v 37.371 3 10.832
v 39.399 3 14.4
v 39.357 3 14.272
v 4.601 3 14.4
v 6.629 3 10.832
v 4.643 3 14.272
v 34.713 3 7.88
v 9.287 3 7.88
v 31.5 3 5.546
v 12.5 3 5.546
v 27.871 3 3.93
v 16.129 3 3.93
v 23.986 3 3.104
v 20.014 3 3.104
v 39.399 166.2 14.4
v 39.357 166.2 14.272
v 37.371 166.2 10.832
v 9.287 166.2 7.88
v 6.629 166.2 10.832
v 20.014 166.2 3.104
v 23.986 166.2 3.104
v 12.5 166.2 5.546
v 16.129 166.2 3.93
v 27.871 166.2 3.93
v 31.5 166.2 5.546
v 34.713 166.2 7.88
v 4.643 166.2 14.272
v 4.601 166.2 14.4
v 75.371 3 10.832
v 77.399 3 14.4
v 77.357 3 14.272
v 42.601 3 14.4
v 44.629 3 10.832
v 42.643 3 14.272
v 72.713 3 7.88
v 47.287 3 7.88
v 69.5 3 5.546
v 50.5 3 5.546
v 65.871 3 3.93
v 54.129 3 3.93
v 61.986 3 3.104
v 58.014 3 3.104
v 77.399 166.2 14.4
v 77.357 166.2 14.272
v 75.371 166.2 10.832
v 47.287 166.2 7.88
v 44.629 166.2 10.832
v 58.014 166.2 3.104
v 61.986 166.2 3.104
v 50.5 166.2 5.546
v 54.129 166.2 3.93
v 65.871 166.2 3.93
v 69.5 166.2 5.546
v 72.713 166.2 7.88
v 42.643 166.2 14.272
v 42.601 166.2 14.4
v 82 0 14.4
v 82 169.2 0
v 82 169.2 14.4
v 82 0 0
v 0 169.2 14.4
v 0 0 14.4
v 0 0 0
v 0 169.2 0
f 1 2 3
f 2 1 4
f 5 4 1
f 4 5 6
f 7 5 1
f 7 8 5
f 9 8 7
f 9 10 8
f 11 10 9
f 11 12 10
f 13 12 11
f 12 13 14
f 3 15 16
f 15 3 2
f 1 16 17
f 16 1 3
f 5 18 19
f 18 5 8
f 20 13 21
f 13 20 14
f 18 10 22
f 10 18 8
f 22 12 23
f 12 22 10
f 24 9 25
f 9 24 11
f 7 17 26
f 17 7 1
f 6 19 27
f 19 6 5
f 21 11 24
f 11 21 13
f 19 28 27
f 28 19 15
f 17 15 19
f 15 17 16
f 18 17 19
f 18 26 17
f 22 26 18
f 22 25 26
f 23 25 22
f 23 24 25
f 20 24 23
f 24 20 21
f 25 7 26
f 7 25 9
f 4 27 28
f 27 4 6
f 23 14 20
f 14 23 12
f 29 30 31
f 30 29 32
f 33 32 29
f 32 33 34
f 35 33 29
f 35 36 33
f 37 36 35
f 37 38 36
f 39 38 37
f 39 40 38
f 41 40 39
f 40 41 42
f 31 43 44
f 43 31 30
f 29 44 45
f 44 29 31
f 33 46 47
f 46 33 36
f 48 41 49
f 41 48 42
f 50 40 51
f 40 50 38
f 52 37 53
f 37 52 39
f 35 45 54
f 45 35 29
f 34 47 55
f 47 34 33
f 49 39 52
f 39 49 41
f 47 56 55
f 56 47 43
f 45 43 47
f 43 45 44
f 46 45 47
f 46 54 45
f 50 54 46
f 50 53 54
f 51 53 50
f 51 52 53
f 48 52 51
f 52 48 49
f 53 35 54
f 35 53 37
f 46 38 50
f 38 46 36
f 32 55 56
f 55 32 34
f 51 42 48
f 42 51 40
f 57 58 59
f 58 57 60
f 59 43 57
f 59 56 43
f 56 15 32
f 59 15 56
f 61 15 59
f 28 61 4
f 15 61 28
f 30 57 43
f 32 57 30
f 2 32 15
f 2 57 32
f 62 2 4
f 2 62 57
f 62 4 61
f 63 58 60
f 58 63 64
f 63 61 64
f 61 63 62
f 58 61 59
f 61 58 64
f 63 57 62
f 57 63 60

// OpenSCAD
//=============================================================================
// tealight-tray.scad
//
// A simple tray for storing tealights, keeping them from rolling around.
//=============================================================================
// Written in 2017 by Patrick Barrett
//
// To the extent possible under law, the author(s) have dedicated all copyright
// and related and neighboring rights to this work to the public domain
// worldwide. This work is distributed without any warranty.
//
// See <http://creativecommons.org/publicdomain/zero/1.0/> for full dedication.
//=============================================================================

// dimensions
candlerows = 2;
candlecols = 12;
depthpercent = 30;

candledia = 38;
candleheight = 13.6;

minwall = 3;

// 100x180 max

// customizable variables end here

abit = 0.001; //use for making overlap to get single manifold stl
alot = 150;

//$fn = 200;

bw = candlerows * candledia + 2*minwall;
bl = candlecols * candleheight + 2*minwall;
bh = (depthpercent/100) * candledia + minwall;

candlerowlen = candleheight * candlecols;

module donut(d, h) {
    translate([0,0,h/2])
    rotate_extrude()
    translate([d/2-h/2, 0, 0])
    circle(d = h);
}
// main body
difference() {
    cube([bw, bl, bh]);
    
    for(i = [0:candlerows-1]) {
        translate([candledia*i, 0, 0])
        translate([candledia/2 + minwall, minwall, candledia/2 + minwall])
        rotate([-90,0,0])
        cylinder(h = candlerowlen, d = candledia);
    }
}
